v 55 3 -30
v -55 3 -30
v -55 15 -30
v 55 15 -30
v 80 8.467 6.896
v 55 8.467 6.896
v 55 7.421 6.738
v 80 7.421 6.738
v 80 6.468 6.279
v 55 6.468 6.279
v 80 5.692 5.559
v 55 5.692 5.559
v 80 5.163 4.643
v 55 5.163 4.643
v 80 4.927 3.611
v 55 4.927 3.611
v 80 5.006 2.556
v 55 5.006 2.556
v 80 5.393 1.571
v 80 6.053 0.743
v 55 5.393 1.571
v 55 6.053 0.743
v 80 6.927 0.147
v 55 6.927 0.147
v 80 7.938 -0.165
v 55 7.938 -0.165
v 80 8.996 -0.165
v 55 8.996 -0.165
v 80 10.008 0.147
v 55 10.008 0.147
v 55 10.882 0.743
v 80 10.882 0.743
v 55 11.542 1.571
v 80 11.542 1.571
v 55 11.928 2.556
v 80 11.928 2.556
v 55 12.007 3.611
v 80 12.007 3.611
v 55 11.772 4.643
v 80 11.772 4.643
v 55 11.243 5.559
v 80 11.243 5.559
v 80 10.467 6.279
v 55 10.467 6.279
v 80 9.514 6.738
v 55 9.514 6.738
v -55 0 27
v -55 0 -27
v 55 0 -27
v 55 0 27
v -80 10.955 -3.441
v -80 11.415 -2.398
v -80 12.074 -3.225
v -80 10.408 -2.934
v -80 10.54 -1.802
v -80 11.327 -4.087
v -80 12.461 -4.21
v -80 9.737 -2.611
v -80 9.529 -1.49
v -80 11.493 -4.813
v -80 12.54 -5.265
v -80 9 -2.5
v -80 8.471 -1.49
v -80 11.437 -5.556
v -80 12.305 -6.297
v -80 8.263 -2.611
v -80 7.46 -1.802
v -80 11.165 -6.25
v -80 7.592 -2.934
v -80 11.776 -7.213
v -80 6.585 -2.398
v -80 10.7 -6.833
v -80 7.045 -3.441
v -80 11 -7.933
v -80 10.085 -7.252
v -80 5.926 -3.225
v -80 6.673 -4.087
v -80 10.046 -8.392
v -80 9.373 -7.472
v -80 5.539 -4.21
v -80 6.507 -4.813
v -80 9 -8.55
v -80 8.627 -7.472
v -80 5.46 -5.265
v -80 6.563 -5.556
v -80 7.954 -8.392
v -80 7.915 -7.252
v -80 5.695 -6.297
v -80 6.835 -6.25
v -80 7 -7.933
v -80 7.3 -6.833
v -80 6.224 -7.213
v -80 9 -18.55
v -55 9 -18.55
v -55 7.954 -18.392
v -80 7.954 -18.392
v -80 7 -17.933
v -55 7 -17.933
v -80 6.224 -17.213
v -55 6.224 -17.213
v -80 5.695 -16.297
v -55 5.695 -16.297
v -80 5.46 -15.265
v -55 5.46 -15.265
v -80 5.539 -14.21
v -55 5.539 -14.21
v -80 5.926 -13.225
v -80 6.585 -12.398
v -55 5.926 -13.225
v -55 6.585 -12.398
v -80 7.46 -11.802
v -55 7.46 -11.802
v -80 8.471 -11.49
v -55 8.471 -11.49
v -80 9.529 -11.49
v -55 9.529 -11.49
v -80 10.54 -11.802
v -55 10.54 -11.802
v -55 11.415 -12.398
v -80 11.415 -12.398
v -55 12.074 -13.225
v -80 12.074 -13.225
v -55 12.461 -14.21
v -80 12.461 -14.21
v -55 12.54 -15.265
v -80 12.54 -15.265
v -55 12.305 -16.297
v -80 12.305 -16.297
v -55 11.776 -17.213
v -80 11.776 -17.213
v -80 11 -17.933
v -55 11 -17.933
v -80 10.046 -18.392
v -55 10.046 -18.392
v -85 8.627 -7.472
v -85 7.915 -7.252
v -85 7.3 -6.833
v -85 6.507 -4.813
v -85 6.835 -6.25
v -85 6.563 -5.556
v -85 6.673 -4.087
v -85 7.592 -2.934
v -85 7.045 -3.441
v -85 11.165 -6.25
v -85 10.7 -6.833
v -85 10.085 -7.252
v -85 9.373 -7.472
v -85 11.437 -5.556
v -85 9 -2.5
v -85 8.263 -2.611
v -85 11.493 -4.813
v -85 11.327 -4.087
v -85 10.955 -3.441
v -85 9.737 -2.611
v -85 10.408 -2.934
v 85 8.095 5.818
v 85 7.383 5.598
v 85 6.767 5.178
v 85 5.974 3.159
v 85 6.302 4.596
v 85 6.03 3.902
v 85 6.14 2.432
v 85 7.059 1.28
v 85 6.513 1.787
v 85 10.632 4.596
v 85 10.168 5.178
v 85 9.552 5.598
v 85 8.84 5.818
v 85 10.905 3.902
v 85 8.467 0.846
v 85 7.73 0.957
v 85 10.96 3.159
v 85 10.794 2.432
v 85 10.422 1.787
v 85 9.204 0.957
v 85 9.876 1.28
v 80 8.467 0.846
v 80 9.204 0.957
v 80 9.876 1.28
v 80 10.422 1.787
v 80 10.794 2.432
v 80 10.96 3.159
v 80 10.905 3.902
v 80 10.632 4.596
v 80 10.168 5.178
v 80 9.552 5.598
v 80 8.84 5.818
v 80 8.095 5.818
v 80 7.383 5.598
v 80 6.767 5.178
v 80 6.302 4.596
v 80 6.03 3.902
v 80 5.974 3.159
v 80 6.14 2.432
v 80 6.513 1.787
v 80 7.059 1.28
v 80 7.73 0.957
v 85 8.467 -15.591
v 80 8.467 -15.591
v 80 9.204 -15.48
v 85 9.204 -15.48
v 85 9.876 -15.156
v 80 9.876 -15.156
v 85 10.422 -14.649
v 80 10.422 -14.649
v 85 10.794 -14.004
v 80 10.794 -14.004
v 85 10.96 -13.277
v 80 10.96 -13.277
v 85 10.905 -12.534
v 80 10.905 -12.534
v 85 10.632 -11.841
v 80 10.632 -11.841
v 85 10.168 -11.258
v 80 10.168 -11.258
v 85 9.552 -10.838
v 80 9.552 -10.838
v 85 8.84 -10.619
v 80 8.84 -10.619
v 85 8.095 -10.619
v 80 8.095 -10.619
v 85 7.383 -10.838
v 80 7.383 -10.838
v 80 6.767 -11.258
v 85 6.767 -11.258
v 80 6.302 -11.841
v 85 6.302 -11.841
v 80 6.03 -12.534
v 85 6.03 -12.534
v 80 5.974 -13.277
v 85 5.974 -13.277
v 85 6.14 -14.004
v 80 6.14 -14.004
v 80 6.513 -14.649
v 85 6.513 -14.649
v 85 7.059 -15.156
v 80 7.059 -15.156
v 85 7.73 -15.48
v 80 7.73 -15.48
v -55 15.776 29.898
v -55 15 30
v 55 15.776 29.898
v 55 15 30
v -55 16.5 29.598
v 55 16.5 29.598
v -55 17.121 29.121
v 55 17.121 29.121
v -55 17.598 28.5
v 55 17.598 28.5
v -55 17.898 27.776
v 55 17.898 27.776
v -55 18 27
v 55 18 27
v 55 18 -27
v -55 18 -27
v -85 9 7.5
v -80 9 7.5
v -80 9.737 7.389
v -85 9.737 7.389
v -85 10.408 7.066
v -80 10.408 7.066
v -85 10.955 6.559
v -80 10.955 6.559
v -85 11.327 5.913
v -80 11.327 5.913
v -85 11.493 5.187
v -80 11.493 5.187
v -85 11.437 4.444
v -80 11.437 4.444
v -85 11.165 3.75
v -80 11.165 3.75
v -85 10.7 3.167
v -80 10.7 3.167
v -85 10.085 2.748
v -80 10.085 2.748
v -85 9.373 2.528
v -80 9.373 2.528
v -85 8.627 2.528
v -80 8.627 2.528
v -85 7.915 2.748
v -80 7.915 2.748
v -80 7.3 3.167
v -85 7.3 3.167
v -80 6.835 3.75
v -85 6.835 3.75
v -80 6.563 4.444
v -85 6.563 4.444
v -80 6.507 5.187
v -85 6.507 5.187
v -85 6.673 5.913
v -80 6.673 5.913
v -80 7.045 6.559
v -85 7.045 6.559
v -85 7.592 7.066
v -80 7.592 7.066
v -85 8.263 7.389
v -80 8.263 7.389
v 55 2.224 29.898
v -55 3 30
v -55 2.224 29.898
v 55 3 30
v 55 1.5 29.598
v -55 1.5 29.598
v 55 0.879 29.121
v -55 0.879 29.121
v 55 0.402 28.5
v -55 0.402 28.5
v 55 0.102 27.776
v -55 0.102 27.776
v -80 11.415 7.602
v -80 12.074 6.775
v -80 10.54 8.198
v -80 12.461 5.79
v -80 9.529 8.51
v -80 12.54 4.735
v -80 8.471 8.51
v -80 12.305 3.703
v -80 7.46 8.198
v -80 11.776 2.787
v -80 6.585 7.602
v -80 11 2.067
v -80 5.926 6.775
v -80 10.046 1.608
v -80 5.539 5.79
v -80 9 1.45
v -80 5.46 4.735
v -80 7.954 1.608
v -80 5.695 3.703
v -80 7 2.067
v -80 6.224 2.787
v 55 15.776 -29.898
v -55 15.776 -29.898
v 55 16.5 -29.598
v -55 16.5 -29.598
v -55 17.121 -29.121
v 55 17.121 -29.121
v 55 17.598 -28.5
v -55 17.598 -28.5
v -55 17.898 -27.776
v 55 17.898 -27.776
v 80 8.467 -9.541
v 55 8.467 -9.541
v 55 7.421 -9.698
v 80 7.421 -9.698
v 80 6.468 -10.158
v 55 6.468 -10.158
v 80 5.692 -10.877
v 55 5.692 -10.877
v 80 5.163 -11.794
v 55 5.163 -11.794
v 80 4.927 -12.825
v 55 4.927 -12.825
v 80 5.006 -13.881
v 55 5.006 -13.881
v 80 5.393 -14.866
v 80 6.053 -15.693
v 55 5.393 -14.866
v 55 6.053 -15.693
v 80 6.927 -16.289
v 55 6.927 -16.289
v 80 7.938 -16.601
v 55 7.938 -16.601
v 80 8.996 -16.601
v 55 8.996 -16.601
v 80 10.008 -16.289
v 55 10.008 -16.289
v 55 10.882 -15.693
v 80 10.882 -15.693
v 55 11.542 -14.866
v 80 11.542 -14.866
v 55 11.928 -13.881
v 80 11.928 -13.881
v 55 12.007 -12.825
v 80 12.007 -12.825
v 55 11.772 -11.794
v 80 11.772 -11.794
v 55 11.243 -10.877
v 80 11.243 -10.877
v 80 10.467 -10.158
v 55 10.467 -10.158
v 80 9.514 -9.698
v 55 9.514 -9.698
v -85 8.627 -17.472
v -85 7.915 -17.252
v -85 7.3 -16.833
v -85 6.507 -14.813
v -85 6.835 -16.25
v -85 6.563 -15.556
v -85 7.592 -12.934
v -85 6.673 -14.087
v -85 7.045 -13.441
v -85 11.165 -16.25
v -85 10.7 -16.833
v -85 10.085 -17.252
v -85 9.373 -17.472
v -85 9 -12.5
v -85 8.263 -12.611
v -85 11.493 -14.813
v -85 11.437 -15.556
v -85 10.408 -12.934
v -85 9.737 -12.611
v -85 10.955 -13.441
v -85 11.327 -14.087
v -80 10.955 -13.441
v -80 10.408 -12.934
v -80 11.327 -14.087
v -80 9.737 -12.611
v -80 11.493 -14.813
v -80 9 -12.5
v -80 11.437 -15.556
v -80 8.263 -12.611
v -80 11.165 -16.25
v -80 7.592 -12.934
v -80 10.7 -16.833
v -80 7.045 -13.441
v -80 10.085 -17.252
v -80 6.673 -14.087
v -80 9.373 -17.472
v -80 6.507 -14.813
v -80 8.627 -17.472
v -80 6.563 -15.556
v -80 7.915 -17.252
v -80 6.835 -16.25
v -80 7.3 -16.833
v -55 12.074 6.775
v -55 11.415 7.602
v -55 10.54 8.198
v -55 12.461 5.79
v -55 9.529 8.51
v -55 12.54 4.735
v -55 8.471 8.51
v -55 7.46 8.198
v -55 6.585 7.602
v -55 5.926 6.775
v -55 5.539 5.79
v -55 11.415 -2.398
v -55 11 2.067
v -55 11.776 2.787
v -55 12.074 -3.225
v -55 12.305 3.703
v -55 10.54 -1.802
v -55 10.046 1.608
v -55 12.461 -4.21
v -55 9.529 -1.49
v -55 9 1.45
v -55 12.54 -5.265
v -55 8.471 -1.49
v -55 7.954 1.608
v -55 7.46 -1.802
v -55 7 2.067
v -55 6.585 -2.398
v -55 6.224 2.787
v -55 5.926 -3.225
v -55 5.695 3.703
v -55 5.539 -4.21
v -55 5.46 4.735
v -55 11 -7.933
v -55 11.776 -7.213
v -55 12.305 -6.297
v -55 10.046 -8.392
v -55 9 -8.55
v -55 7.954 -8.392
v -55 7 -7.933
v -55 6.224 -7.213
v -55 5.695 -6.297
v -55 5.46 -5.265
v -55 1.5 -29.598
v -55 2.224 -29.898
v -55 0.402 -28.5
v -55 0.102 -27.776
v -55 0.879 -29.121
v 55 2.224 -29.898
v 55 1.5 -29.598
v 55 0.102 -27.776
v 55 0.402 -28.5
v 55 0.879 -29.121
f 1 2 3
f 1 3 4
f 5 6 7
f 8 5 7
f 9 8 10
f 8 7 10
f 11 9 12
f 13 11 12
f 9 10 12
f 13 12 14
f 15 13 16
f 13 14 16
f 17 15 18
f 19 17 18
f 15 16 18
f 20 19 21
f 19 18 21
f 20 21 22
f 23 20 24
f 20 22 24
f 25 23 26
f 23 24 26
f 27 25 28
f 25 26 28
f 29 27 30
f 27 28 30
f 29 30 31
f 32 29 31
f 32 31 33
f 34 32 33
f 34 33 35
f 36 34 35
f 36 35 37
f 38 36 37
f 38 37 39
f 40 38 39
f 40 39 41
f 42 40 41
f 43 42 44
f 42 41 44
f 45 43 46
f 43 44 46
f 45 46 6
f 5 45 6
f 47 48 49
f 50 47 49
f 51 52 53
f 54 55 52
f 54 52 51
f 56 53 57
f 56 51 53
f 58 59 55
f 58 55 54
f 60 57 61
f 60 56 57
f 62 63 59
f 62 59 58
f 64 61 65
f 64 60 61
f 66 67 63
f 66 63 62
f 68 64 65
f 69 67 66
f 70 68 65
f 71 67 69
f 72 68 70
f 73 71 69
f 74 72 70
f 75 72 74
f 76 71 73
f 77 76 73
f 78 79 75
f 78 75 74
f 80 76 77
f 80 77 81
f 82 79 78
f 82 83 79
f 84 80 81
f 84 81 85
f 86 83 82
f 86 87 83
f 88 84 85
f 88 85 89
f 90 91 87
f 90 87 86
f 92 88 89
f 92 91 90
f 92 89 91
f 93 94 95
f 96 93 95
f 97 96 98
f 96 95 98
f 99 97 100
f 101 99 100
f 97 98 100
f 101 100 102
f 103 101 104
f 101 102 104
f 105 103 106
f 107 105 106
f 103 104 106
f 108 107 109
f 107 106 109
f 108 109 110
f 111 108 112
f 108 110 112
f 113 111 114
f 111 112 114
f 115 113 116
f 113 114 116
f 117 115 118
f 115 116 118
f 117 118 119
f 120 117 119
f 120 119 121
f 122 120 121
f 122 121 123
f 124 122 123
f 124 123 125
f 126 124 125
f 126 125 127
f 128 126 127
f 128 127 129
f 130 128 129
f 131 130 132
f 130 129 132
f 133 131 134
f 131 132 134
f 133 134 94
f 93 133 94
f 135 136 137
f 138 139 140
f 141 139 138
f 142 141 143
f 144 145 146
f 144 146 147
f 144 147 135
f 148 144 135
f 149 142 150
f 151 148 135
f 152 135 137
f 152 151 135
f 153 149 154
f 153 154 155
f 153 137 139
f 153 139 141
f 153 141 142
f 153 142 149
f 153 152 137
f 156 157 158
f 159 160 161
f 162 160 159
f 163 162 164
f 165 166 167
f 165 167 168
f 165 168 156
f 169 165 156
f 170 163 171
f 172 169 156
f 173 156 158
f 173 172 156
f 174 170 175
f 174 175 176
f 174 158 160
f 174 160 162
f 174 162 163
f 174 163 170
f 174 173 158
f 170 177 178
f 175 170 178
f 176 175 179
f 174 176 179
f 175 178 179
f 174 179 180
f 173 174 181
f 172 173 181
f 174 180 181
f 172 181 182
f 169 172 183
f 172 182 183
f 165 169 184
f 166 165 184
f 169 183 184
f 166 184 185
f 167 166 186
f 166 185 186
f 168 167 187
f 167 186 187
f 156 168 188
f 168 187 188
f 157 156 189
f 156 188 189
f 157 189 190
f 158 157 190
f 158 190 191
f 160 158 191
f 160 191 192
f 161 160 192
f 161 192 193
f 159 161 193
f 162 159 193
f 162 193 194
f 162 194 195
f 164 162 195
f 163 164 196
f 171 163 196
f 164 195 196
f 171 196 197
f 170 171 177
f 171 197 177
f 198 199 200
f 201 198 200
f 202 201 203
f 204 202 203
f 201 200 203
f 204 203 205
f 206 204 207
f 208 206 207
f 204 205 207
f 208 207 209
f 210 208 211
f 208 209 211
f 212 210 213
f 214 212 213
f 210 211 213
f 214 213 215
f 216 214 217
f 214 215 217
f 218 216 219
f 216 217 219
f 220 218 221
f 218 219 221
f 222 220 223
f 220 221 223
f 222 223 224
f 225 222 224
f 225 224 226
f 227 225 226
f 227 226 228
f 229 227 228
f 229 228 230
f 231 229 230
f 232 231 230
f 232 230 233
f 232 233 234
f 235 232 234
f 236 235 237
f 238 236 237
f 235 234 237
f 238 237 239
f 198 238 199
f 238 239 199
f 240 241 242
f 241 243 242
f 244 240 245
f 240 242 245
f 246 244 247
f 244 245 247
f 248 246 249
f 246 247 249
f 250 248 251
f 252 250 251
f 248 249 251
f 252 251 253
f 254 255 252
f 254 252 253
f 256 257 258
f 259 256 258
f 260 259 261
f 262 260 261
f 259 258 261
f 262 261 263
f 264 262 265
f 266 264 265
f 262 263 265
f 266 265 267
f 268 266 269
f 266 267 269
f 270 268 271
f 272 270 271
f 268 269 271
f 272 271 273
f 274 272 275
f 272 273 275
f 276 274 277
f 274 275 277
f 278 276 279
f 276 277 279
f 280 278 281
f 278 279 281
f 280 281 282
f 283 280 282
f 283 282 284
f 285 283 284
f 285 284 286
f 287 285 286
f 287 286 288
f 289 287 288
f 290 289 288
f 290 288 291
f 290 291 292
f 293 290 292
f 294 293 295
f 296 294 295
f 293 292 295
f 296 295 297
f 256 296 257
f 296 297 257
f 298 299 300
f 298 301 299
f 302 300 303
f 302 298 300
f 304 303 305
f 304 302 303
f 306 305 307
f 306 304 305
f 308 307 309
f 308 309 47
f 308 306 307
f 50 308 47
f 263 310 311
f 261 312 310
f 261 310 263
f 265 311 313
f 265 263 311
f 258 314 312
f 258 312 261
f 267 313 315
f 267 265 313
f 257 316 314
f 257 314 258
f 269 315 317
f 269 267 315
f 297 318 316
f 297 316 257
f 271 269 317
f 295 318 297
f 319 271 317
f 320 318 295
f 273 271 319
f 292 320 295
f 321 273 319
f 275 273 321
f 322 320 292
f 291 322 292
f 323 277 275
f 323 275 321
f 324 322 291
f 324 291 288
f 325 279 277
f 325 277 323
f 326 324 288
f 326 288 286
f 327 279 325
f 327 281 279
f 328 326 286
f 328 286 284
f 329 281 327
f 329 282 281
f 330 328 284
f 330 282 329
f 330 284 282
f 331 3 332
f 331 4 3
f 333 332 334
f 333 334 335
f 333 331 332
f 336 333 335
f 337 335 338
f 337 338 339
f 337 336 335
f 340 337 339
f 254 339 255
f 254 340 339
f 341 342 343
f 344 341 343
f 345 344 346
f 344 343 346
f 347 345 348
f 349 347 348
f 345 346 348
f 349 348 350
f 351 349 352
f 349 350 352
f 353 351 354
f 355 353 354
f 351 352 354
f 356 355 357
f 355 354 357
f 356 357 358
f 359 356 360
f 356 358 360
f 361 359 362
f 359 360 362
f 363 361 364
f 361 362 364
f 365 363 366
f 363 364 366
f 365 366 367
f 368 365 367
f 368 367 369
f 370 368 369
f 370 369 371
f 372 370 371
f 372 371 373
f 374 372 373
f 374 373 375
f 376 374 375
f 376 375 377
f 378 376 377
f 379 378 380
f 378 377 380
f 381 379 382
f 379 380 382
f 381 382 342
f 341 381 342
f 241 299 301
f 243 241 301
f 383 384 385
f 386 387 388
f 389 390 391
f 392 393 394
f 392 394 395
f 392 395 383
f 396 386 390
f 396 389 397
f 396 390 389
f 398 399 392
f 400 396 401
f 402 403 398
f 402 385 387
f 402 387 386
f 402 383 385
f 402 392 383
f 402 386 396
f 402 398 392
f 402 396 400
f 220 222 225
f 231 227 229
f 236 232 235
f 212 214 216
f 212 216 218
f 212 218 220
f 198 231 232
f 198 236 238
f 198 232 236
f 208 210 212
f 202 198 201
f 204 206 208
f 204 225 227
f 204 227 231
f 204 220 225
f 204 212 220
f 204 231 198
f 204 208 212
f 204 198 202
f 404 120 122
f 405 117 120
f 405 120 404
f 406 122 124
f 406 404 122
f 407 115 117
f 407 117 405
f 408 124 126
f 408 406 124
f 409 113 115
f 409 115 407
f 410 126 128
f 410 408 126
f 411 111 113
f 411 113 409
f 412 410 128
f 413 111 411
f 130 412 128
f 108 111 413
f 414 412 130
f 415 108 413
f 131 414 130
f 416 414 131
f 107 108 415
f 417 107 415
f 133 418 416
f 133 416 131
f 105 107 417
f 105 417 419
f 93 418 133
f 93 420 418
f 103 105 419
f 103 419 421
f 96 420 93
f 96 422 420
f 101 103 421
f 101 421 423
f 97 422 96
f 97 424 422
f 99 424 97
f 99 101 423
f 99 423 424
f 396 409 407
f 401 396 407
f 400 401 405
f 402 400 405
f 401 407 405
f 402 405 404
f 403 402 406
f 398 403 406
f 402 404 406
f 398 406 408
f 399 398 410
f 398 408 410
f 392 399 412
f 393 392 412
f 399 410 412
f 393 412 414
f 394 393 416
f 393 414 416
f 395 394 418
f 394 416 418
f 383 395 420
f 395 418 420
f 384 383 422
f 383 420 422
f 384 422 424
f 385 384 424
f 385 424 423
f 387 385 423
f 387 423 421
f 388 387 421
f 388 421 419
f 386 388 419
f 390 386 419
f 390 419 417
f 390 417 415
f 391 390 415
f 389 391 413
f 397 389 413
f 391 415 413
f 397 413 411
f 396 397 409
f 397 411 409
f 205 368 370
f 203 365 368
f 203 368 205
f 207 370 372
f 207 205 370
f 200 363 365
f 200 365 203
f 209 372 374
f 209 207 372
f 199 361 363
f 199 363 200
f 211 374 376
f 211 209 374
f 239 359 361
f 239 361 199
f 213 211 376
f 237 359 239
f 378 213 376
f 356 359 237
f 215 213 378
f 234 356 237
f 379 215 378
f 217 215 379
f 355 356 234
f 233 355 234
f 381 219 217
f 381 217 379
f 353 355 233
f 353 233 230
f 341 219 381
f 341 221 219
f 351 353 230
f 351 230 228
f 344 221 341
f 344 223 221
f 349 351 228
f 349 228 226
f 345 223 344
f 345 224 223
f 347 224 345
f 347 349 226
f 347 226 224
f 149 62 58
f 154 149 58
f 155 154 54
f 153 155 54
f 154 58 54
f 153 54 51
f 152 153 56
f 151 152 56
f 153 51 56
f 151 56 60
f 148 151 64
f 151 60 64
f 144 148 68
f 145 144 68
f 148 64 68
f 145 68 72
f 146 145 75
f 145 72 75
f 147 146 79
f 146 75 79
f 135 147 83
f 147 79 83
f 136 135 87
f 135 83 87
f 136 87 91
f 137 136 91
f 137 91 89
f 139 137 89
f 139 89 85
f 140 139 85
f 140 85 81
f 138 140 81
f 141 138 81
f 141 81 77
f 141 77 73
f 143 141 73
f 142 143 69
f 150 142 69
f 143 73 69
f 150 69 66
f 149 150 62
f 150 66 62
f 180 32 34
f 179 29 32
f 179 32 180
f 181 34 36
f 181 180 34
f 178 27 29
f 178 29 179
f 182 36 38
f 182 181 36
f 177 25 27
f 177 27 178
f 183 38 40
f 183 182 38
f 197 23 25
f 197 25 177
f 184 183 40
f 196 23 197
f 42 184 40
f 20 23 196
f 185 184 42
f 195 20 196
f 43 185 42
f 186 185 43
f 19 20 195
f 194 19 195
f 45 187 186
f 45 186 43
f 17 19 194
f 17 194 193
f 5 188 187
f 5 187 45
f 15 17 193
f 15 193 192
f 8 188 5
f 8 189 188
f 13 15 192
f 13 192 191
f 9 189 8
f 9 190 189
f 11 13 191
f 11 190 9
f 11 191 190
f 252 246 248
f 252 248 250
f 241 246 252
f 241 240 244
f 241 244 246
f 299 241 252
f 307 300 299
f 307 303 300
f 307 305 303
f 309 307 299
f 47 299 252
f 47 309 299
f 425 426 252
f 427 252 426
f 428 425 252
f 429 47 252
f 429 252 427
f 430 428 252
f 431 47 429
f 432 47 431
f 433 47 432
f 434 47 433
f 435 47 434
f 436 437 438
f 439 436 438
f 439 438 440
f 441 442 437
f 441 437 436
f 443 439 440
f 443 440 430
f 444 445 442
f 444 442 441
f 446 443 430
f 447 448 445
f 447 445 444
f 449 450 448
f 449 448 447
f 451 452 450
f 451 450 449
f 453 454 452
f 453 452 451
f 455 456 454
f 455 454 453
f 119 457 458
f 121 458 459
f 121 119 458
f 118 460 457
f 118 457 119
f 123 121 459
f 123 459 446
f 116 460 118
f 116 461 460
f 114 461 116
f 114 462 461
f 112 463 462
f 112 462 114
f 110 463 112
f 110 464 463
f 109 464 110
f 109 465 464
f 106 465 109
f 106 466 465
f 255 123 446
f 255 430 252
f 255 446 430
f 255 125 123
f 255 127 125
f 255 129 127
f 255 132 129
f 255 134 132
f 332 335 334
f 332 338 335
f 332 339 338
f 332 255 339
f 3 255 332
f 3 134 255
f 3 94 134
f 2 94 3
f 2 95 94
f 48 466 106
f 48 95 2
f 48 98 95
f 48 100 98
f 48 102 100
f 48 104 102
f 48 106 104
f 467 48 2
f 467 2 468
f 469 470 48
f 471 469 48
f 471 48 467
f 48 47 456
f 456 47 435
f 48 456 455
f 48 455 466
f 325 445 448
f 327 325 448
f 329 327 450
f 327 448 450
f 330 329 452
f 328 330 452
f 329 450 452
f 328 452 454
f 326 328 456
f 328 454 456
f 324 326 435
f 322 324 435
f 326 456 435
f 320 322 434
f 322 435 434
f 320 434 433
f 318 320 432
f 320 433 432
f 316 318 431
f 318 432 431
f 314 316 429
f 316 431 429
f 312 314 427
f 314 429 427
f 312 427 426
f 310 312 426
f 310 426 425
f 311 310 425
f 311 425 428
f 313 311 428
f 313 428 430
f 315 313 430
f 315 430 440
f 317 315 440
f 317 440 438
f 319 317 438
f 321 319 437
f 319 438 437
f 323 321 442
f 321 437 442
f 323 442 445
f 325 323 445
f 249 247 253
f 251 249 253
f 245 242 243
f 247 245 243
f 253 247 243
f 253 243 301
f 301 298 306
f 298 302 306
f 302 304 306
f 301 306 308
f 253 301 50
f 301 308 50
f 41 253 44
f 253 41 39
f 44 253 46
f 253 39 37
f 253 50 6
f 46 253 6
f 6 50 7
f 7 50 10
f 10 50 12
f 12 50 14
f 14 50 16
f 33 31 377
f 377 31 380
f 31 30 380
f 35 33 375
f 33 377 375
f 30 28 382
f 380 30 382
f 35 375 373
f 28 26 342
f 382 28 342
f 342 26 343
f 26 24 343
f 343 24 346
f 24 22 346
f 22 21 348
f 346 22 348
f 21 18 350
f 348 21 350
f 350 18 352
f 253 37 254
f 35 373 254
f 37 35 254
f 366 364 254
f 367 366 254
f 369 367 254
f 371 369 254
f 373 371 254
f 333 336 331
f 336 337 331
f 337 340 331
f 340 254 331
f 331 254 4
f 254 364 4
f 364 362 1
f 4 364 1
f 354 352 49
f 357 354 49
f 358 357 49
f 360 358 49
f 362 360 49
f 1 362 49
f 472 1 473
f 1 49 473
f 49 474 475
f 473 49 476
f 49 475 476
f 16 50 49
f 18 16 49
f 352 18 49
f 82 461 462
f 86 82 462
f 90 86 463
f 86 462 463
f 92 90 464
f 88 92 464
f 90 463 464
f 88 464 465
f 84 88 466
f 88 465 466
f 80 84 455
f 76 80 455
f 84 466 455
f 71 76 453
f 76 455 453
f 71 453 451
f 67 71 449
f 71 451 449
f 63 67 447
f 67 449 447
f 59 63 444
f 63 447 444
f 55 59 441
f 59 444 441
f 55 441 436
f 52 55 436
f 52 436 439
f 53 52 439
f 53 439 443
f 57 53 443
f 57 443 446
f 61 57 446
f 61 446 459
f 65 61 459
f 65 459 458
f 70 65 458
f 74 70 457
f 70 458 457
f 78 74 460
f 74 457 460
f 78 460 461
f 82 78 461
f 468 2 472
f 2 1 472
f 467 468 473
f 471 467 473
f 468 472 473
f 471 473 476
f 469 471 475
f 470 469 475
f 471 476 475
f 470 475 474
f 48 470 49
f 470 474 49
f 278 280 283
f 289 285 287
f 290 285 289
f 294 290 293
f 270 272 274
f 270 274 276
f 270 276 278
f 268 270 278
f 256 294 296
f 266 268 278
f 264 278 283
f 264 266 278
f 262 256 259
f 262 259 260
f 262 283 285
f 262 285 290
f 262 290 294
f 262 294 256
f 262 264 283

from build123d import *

# Parameters (mm, degrees)
SKETCH1_W           = 110
SKETCH1_H           = 60
BOSS_EXTRUDE1_DEPTH = 18
FILLET1_R           = 3
SKETCH2_R           = 3.55
BOSS_EXTRUDE2_DEPTH = 25
SKETCH3_R           = 3.55
BOSS_EXTRUDE3_DEPTH = 25
SKETCH4_R           = 2.5
BOSS_EXTRUDE4_DEPTH = 5
SKETCH5_R           = 2.5
BOSS_EXTRUDE5_DEPTH = 5


with BuildPart() as part:
    # Sketch1 → Boss-Extrude1 (new body)
    with BuildSketch(Plane(origin=(0, 0, 0), x_dir=(1, 0, 0), z_dir=(0, 1, 0))):
        Rectangle(SKETCH1_W, SKETCH1_H)
    extrude(amount=BOSS_EXTRUDE1_DEPTH)

    # Fillet1
    fillet1_edges = [part.edges().sort_by_distance(p)[0] for p in [
        (0, 18, 30),
        (0, 0, 30),
        (0, 0, -30),
        (0, 18, -30),
    ]]
    fillet(fillet1_edges, radius=FILLET1_R)

    # Sketch2 → Boss-Extrude2 (add)
    with BuildSketch(Plane(origin=(55, 0, 0), x_dir=(0, 0, -1), z_dir=(1, 0, 0))):
        with Locations(Location((13.090661553, 8.467313241, 0), (0, 0, 180))):
            Circle(SKETCH2_R)
        with Locations(Location((-3.345586855, 8.467313241, 0), (0, 0, 180))):
            Circle(SKETCH2_R)
    extrude(amount=BOSS_EXTRUDE2_DEPTH)

    # Sketch3 → Boss-Extrude3 (add)
    with BuildSketch(Plane.ZY.offset(55)):
        with Locations(Location((-15, 9, 0), (0, 0, 180))):
            Circle(SKETCH3_R)
        with Locations(Location((5, 9, 0), (0, 0, 180))):
            Circle(SKETCH3_R)
        with Locations(Location((-5, 9, 0), (0, 0, 180))):
            Circle(SKETCH3_R)
    extrude(amount=BOSS_EXTRUDE3_DEPTH)

    # Sketch4 → Boss-Extrude4 (add)
    with BuildSketch(Plane.ZY.offset(80)):
        with Locations((-15, 9)):
            Circle(SKETCH4_R)
        with Locations((-5, 9)):
            Circle(SKETCH4_R)
        with Locations((5, 9)):
            Circle(SKETCH4_R)
    extrude(amount=BOSS_EXTRUDE4_DEPTH)

    # Sketch5 → Boss-Extrude5 (add)
    with BuildSketch(Plane(origin=(80, 0, 0), x_dir=(0, 0, -1), z_dir=(1, 0, 0))):
        with Locations((-3.345586855, 8.467313241)):
            Circle(SKETCH5_R)
        with Locations((13.090661553, 8.467313241)):
            Circle(SKETCH5_R)
    extrude(amount=BOSS_EXTRUDE5_DEPTH)


solid = part.part
